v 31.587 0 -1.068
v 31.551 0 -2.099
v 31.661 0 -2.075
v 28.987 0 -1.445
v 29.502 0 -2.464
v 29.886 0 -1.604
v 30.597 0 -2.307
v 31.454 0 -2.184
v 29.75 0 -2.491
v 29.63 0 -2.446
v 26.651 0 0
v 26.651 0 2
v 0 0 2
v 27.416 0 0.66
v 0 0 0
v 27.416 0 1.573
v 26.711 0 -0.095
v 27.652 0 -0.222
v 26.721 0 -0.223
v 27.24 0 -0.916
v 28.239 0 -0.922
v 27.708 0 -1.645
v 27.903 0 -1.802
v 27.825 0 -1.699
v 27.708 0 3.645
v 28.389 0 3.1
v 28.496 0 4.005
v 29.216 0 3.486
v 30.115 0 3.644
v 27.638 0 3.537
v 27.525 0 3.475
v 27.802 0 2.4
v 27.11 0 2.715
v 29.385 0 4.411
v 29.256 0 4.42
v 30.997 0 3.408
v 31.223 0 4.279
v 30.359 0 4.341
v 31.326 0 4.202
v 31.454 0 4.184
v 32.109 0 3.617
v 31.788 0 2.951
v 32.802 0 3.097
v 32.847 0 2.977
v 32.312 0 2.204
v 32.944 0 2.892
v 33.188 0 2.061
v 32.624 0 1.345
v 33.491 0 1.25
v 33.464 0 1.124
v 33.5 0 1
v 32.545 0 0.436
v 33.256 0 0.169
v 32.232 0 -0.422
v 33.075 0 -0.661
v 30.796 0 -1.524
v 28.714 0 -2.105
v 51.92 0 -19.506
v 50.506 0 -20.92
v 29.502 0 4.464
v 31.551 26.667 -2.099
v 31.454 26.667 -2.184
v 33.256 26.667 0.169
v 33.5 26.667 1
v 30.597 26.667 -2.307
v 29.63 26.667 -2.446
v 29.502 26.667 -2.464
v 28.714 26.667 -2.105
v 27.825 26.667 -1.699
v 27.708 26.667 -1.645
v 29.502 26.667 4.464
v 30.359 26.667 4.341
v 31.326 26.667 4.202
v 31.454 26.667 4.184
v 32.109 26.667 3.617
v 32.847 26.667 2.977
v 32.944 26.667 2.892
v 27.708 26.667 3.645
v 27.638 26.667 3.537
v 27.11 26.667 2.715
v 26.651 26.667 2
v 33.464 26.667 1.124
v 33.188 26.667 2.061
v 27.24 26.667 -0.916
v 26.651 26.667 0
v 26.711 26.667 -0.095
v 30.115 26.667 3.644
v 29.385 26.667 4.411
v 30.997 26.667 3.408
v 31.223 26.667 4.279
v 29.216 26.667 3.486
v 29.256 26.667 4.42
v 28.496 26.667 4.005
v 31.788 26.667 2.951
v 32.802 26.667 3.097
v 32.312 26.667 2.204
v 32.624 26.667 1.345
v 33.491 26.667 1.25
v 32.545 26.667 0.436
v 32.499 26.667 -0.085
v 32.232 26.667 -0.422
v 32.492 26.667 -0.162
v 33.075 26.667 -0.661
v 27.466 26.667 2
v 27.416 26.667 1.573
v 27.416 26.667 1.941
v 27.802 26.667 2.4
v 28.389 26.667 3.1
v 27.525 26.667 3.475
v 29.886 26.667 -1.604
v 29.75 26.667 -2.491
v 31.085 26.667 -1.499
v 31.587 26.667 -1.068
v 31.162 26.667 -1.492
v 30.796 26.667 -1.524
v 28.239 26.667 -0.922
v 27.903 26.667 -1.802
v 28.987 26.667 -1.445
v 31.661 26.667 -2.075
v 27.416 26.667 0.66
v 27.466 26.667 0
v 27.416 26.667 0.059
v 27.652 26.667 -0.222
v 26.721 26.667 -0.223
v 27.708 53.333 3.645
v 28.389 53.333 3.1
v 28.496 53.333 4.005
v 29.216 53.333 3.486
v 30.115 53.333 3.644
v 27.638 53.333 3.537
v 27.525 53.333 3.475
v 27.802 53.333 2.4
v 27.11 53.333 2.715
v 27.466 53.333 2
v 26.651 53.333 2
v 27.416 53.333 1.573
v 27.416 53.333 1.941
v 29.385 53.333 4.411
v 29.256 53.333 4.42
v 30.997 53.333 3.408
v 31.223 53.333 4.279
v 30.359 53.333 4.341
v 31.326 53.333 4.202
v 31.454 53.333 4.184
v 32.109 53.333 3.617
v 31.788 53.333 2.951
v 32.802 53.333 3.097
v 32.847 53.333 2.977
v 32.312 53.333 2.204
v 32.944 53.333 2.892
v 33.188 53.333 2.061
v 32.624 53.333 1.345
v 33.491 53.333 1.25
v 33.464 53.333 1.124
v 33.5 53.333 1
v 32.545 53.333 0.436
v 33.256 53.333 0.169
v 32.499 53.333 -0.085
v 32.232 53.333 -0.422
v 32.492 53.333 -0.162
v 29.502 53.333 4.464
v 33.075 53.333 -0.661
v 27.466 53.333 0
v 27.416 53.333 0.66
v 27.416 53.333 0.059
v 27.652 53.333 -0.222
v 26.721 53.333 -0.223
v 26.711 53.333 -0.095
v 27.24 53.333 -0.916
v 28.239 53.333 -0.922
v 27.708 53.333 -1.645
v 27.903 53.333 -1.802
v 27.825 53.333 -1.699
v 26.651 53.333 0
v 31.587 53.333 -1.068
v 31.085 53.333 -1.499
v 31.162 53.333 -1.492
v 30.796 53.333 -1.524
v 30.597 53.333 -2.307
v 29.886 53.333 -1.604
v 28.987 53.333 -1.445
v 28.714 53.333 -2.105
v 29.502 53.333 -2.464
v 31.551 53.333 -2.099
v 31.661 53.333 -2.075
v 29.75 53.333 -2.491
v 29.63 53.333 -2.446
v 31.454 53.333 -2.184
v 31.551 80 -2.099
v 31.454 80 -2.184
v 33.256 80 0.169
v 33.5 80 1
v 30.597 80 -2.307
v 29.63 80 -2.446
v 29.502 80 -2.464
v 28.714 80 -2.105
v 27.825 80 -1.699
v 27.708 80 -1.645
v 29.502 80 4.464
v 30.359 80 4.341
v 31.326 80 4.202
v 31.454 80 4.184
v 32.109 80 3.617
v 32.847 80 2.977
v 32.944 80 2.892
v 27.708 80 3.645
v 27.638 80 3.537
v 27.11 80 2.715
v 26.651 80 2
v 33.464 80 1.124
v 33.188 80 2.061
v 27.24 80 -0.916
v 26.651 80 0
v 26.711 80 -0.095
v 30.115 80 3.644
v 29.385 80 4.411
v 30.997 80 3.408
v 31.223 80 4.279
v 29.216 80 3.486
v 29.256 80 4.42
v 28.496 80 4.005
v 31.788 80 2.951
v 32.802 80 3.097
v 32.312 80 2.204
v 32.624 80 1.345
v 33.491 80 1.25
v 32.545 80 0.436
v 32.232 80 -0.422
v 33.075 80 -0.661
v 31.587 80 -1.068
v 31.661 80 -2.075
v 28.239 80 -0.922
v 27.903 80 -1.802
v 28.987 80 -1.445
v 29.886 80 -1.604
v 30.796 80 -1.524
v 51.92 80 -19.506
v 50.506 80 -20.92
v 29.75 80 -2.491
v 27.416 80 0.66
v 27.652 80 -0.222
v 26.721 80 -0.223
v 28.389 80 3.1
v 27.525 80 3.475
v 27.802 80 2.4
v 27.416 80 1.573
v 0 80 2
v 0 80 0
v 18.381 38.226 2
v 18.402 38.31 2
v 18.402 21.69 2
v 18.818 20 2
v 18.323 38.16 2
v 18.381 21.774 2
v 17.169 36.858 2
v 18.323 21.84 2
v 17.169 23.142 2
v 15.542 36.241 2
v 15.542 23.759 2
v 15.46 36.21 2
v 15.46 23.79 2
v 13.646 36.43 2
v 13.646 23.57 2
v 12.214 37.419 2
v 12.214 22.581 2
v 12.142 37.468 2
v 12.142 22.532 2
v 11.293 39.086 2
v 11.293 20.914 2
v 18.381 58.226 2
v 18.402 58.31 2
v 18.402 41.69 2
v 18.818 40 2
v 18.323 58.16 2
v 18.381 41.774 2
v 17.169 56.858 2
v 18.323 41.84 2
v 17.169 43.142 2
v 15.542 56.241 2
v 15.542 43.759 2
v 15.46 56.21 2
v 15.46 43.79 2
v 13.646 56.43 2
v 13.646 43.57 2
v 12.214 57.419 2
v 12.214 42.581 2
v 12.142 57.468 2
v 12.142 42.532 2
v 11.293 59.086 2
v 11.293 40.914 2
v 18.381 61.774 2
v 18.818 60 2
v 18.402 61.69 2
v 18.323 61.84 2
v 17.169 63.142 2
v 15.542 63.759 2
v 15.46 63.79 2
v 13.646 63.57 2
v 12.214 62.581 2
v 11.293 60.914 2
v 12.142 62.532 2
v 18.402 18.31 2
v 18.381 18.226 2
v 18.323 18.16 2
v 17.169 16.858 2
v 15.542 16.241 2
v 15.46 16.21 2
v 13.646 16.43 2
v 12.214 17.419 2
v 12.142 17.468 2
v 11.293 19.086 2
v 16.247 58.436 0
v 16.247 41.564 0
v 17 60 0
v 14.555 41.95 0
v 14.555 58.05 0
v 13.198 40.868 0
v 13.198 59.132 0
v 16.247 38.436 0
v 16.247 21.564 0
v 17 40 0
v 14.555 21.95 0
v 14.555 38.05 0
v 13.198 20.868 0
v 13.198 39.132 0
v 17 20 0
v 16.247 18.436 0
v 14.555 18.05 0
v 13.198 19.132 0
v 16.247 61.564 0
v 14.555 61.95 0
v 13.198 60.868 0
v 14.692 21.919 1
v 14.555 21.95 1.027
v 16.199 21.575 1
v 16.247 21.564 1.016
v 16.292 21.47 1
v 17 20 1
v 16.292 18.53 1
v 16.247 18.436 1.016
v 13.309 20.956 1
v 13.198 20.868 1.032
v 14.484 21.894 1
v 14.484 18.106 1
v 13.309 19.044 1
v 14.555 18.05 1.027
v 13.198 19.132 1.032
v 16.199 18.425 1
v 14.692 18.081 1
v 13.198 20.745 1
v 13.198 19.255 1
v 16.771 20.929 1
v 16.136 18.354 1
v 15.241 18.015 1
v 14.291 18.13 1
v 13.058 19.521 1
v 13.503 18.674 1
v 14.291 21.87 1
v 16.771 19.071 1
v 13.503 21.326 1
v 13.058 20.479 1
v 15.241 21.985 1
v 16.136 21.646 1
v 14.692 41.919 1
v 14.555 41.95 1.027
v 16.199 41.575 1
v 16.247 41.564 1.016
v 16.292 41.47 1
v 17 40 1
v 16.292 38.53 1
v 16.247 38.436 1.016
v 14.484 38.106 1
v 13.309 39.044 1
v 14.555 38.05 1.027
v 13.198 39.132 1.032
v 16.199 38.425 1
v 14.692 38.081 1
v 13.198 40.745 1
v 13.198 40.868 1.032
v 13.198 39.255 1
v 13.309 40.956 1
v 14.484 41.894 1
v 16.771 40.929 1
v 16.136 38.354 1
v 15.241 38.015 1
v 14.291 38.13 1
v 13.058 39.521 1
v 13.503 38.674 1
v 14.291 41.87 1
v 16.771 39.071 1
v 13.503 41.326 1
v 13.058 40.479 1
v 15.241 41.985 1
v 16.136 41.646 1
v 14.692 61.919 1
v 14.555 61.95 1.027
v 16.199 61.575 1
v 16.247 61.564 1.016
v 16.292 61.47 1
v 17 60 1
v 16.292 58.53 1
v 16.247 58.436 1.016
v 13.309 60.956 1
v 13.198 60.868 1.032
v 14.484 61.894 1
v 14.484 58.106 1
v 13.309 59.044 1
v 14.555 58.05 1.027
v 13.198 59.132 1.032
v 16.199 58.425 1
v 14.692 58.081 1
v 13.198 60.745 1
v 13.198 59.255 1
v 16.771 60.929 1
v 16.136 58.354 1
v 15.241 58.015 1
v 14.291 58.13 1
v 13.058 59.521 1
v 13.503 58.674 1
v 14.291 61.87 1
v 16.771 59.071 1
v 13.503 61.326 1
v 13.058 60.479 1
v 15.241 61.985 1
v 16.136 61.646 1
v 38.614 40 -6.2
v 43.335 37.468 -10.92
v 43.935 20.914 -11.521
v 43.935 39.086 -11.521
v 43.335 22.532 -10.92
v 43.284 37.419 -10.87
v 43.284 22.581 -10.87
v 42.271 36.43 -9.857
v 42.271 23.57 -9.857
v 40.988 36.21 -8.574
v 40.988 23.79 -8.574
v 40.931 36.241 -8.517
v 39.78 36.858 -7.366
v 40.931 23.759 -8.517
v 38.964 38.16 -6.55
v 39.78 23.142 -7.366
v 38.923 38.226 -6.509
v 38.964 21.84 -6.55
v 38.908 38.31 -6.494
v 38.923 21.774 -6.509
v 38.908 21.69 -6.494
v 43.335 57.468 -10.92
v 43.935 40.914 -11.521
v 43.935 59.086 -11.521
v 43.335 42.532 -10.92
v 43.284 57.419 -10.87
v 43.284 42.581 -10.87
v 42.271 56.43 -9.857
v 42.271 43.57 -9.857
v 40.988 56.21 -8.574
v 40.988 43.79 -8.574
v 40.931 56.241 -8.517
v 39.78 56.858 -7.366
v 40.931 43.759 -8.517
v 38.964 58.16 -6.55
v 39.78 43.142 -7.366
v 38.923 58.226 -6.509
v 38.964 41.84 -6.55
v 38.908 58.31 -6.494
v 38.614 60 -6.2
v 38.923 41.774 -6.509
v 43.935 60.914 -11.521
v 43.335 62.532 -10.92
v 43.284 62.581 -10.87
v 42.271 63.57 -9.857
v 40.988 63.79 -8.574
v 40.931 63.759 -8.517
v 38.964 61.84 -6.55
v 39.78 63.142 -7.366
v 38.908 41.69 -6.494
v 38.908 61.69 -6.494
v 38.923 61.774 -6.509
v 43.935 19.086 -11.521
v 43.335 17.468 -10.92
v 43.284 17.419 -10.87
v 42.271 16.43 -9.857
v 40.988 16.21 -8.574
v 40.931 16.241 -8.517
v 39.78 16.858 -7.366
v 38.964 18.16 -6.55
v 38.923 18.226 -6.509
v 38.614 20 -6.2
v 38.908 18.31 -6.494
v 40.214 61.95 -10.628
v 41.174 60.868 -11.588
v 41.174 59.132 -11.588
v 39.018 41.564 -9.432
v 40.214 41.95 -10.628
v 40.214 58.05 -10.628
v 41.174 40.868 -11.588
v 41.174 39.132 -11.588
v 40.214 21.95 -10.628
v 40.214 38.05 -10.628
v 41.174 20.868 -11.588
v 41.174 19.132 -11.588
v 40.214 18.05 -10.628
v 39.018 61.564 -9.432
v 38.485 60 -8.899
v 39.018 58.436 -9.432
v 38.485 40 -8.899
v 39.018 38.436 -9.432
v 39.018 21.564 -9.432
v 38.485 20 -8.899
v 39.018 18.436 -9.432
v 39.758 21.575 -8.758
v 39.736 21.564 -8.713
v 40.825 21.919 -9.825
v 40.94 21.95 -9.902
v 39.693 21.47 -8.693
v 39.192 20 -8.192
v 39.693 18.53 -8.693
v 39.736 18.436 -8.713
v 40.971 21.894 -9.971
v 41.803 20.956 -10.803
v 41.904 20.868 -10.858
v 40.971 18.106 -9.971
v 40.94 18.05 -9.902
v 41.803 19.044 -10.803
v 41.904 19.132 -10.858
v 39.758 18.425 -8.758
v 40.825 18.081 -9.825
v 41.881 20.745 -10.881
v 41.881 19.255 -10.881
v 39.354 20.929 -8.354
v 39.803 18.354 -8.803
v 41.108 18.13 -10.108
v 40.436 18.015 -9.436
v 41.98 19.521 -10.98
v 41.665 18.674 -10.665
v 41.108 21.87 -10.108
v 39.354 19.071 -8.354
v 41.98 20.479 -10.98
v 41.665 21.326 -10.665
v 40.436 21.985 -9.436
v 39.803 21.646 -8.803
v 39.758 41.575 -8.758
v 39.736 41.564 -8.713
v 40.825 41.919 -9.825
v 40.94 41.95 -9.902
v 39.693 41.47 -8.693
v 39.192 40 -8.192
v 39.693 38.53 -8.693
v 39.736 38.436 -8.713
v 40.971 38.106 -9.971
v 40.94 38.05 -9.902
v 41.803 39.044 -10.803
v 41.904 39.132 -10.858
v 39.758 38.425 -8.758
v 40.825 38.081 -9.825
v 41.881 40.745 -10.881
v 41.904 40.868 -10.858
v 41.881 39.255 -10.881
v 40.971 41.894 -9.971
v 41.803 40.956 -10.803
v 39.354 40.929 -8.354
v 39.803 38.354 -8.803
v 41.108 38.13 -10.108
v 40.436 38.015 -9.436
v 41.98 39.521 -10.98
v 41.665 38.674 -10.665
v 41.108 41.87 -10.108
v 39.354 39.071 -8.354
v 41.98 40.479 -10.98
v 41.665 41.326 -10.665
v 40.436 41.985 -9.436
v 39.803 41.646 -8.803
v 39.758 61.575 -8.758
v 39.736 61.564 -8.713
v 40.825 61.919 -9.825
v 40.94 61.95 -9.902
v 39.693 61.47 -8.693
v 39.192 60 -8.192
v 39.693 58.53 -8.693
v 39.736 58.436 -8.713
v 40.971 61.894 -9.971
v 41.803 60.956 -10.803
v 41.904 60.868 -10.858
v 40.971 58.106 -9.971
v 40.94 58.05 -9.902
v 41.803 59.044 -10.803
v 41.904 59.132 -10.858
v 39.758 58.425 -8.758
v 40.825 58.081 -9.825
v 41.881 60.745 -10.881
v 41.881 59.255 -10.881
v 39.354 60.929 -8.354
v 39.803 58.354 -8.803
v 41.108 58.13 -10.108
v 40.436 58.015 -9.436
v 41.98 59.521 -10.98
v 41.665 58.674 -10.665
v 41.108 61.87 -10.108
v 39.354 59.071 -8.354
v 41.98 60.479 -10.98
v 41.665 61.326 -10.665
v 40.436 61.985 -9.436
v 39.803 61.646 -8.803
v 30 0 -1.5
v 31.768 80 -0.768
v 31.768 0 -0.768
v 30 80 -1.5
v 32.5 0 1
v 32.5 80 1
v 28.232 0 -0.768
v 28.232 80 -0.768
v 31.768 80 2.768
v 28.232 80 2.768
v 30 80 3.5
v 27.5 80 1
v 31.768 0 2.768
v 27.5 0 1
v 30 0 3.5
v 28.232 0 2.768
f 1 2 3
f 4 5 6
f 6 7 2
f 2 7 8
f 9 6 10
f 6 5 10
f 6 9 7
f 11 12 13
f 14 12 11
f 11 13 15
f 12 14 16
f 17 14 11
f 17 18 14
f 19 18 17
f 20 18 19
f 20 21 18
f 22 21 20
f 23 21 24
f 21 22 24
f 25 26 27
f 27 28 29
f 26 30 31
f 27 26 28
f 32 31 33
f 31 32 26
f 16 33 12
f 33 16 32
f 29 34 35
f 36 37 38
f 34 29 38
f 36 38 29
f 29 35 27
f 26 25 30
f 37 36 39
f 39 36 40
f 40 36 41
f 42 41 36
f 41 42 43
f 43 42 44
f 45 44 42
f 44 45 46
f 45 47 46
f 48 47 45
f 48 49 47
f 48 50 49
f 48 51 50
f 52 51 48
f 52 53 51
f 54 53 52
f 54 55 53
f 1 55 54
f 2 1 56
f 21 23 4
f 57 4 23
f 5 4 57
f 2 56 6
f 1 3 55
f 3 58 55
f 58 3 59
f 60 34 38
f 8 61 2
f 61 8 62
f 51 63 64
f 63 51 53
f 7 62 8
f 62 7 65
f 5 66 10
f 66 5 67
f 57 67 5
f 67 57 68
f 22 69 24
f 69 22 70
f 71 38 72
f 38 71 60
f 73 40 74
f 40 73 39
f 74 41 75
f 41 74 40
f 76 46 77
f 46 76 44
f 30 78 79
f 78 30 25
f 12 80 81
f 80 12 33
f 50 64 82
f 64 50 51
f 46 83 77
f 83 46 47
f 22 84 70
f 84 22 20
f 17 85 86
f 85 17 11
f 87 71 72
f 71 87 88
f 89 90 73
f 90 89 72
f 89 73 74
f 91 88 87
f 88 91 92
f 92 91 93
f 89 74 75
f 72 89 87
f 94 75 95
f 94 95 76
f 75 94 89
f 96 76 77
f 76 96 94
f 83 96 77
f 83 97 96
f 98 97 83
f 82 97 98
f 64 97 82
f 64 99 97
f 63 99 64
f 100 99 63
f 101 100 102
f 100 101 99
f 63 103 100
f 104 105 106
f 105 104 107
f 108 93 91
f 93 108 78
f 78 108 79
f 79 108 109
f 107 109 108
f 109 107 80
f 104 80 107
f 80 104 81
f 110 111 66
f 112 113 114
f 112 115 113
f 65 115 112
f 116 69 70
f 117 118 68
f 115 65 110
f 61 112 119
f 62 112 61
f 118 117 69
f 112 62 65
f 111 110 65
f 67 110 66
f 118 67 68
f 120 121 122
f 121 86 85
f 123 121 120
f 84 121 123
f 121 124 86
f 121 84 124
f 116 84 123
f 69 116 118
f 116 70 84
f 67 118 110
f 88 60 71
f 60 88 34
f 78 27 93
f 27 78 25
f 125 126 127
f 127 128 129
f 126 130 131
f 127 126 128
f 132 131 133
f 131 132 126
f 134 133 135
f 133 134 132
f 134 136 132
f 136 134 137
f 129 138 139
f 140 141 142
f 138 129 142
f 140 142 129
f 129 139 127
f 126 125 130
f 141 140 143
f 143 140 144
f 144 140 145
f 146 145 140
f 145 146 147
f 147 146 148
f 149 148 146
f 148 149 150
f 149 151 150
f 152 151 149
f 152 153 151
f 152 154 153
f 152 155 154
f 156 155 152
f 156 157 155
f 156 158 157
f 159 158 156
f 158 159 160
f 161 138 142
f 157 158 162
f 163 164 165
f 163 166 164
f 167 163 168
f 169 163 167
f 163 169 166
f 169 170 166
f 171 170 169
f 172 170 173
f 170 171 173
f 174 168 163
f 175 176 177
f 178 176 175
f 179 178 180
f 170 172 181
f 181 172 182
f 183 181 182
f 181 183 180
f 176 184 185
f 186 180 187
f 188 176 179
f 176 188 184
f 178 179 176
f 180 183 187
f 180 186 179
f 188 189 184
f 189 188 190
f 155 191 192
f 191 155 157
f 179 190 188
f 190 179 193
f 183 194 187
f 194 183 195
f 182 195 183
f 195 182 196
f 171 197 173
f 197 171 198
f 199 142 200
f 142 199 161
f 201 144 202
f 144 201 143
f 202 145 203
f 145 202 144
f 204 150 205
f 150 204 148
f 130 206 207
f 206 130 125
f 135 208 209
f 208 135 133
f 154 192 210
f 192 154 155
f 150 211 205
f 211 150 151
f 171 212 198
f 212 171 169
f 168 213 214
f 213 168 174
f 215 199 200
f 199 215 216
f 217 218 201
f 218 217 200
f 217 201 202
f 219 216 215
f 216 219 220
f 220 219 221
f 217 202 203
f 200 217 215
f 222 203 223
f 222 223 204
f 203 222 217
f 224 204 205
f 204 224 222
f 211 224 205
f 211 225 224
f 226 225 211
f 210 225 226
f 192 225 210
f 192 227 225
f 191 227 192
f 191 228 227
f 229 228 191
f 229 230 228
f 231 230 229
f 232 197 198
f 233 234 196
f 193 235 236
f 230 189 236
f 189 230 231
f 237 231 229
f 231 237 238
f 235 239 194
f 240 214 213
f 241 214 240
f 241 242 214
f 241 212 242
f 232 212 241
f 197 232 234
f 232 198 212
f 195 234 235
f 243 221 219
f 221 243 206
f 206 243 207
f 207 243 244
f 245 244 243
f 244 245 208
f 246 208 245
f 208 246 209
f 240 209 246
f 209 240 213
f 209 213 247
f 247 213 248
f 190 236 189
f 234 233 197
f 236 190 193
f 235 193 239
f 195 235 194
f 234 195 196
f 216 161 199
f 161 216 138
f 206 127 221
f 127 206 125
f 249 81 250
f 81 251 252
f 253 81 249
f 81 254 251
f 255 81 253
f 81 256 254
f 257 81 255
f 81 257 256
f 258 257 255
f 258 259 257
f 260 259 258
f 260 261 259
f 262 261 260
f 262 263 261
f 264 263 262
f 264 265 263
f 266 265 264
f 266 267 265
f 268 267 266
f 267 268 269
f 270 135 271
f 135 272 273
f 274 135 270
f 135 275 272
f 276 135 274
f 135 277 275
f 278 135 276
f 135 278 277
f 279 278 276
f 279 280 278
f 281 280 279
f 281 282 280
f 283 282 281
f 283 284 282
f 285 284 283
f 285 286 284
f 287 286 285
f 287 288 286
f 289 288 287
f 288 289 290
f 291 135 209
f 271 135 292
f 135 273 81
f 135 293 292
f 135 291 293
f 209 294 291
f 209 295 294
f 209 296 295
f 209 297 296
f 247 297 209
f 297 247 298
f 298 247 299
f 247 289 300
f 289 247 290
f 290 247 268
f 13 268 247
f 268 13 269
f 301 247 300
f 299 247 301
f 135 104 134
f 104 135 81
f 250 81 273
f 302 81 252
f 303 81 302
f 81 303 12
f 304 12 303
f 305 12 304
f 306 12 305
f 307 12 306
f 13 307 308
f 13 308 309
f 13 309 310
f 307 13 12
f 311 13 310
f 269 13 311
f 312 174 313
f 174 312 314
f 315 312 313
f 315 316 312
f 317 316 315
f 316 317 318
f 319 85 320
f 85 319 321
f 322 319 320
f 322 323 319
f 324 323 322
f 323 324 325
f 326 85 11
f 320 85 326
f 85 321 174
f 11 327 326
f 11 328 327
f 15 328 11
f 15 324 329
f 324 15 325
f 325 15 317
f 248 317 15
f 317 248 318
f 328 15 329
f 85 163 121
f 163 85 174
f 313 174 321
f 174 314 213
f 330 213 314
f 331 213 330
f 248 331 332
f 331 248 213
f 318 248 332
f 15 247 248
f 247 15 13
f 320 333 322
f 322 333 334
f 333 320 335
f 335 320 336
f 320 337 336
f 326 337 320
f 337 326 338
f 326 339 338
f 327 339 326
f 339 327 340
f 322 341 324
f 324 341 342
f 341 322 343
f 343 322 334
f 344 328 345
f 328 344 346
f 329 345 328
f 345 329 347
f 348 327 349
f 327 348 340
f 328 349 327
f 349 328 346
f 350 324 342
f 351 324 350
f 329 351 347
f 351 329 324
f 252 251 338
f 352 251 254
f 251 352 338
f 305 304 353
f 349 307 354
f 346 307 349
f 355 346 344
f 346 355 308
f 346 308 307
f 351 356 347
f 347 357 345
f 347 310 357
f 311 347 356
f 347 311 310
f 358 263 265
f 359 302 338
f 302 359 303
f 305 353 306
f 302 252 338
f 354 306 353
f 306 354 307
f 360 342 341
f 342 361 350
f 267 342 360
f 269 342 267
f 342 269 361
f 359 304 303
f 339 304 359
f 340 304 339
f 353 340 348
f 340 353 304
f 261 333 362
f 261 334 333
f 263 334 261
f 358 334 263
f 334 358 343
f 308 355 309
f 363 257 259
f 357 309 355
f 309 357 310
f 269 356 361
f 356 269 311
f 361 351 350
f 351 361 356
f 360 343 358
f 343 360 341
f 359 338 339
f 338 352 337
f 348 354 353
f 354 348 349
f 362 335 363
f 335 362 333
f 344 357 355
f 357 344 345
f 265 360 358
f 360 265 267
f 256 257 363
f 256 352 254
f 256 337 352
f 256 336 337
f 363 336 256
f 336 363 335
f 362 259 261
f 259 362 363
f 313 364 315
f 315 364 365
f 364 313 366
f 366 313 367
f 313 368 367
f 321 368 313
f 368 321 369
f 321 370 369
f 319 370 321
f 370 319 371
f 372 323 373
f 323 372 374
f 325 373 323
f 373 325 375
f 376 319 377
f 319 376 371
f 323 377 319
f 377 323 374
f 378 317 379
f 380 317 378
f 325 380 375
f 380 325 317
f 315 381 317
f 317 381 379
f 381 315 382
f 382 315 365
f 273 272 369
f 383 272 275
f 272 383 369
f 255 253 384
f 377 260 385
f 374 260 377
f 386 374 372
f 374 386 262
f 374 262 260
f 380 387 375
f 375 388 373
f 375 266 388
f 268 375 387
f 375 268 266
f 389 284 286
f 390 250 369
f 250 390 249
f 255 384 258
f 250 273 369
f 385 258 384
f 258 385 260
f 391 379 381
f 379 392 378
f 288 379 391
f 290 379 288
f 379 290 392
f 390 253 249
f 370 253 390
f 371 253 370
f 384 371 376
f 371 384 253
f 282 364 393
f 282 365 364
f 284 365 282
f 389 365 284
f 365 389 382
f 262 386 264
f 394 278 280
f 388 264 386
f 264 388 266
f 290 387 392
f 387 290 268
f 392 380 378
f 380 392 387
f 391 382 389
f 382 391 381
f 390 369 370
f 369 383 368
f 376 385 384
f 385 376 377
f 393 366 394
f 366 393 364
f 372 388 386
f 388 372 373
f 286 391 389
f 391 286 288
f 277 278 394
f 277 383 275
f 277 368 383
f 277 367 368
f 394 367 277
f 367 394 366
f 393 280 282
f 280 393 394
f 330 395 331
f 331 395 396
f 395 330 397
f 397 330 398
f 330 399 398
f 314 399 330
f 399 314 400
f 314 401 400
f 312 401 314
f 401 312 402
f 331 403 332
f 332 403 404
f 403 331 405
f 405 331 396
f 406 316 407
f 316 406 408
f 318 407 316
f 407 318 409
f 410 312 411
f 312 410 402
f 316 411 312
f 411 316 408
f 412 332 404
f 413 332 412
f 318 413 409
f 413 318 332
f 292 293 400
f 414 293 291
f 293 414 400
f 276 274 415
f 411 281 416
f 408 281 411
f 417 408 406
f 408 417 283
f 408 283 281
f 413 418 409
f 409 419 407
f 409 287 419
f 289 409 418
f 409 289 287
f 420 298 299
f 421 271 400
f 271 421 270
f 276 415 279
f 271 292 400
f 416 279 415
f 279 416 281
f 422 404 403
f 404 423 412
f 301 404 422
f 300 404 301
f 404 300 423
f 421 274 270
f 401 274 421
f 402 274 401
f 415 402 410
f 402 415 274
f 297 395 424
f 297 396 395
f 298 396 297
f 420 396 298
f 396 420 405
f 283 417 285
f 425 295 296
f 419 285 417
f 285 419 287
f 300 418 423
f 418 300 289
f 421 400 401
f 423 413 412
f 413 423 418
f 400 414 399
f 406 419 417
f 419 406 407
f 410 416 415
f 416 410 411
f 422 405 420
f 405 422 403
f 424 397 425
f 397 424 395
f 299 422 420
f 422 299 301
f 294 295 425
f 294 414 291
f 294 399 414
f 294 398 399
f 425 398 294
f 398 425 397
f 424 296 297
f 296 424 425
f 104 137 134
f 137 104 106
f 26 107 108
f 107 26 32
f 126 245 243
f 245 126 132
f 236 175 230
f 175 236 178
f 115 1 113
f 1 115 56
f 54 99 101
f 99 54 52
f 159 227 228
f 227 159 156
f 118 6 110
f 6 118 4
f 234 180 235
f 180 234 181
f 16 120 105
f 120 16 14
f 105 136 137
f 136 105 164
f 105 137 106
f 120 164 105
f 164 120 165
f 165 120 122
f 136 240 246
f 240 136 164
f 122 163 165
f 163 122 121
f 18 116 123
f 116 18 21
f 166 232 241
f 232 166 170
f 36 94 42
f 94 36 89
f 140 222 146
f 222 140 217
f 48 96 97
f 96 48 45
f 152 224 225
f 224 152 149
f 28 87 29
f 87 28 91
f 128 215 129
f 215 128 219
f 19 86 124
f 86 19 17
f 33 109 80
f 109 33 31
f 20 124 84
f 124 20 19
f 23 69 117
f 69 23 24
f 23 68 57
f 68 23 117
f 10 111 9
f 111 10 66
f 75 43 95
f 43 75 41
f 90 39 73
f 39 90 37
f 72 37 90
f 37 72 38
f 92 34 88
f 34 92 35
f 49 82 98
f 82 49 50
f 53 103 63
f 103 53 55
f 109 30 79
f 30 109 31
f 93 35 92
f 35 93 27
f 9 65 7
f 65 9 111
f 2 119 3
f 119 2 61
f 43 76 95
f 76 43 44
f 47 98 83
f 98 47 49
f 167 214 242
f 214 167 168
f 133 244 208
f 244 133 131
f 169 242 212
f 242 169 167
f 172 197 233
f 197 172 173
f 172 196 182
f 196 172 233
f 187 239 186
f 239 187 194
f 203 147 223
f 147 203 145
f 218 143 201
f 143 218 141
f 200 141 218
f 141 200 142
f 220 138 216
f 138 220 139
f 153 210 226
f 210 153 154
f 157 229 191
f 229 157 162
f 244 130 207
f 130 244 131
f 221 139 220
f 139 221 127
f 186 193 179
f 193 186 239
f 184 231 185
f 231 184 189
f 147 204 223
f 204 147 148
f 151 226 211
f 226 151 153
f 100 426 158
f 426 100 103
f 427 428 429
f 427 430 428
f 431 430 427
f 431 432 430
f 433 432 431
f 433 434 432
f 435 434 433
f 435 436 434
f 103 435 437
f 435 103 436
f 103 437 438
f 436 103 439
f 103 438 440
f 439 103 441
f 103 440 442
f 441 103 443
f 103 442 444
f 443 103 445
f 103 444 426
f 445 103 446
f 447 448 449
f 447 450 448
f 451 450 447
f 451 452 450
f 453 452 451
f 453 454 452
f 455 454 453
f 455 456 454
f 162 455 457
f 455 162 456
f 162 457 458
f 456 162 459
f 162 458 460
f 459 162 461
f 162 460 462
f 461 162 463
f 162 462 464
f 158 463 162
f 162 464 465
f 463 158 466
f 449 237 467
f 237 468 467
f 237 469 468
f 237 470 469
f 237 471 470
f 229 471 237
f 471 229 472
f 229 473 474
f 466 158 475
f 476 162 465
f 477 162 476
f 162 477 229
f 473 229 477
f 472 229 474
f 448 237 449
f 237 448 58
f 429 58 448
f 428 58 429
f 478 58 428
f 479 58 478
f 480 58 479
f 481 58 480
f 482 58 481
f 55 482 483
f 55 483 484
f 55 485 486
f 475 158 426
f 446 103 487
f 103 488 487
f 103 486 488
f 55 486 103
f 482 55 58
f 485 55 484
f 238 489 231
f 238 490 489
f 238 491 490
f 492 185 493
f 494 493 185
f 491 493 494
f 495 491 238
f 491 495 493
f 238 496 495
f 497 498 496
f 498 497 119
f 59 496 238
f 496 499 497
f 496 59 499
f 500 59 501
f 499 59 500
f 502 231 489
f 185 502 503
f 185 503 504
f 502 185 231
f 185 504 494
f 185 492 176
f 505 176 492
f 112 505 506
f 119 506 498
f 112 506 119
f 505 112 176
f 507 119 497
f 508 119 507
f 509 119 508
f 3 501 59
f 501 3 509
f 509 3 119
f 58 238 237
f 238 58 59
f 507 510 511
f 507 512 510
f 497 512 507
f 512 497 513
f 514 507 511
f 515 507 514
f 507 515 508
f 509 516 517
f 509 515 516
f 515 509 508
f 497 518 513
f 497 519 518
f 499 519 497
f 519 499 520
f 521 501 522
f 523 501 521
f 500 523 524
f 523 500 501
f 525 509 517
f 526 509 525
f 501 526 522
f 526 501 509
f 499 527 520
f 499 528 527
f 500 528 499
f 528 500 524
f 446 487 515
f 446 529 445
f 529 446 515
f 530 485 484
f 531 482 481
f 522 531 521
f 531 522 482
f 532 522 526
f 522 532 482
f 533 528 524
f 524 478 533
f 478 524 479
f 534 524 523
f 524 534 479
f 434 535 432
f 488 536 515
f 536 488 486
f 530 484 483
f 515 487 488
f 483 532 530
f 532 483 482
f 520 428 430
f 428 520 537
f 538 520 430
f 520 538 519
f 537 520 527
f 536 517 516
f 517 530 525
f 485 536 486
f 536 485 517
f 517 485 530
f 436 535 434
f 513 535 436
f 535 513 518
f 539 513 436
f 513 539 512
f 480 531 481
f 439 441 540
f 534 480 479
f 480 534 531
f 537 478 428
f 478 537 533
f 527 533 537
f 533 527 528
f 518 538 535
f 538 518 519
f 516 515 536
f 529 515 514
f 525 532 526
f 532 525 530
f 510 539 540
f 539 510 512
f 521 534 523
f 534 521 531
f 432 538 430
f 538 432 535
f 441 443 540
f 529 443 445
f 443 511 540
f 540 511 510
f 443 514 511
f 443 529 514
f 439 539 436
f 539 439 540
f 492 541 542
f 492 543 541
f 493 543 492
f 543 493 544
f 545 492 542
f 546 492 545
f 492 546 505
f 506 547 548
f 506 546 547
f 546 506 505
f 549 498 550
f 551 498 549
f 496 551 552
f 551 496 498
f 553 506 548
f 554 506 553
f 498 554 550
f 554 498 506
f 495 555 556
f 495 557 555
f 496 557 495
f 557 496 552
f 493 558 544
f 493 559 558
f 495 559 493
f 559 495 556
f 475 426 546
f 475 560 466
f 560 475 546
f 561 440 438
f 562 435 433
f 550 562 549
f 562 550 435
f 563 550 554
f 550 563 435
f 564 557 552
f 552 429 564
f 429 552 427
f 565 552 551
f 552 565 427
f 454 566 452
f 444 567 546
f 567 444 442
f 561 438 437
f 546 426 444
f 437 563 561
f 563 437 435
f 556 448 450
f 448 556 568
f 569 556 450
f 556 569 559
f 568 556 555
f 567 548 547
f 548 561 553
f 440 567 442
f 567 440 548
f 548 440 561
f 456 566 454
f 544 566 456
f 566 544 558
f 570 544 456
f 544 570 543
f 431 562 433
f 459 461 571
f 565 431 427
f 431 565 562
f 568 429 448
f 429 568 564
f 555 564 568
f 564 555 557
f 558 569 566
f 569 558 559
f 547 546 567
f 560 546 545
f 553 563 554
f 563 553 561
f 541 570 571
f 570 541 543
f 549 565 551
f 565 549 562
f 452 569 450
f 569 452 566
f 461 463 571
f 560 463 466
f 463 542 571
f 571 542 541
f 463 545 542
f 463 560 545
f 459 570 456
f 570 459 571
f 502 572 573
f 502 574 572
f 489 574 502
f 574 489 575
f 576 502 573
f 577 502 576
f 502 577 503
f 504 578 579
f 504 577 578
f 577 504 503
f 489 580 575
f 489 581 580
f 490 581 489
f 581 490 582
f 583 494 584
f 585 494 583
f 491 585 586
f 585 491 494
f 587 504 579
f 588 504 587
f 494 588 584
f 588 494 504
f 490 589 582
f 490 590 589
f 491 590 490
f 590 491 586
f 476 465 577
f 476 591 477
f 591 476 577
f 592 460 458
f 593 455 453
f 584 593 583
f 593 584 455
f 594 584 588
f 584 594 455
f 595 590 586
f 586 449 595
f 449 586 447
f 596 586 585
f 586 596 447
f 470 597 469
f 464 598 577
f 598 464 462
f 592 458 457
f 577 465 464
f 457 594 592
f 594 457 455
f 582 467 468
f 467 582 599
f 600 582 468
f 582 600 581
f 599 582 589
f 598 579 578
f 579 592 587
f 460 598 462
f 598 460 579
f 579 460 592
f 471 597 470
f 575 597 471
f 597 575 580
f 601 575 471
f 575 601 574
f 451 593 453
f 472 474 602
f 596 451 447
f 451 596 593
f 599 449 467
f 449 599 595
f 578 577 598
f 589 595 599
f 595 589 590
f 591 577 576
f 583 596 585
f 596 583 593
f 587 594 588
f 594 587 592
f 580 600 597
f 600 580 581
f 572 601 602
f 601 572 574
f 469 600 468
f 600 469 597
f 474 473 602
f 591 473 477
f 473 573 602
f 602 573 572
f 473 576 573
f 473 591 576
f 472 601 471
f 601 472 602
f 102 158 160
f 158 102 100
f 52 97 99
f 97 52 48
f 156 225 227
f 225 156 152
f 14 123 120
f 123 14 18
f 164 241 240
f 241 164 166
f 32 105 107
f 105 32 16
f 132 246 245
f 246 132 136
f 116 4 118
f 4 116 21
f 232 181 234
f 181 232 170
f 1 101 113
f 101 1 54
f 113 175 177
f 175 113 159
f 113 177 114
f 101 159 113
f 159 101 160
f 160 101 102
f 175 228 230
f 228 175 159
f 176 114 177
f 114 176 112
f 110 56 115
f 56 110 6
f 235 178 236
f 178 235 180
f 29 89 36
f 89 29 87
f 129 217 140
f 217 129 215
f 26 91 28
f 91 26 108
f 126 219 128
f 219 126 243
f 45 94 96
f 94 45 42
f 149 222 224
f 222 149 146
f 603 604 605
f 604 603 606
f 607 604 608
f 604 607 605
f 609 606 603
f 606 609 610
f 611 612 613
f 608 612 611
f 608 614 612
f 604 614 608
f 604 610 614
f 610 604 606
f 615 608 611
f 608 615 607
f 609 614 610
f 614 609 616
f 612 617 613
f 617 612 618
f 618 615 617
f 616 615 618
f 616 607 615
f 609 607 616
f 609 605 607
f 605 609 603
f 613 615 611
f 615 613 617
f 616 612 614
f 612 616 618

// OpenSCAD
// file: ../libs/utils.scad
// SketchCaddy - 通用工具函数库

use <global_params.scad>

// ============================================
// 1010铝型材截面模块
// ============================================
module extrusion_profile_1010(size = 10) {
    wall = 1.2;
    slot_width = 4;
    slot_depth = 2.5;
    
    difference() {
        // 外轮廓
        square(size, center = true);
        
        // 中心孔
        circle(d = size - 2 * wall);
        
        // 四个T槽
        for (angle = [0, 90, 180, 270]) {
            rotate([0, 0, angle])
            translate([0, size/2 - slot_depth/2])
            square([slot_width, slot_depth + 0.1], center = true);
        }
    }
}

// ============================================
// 铝型材拉伸模块
// ============================================
module extrusion_1010(length, size = 10) {
    color(color_frame)
    rotate([90, 0, 0])
    linear_extrude(height = length, center = false)
    extrusion_profile_1010(size);
}

// 沿X轴的型材
module extrusion_x(length, size = 10) {
    rotate([0, 90, 0])
    rotate([0, 0, 90])
    extrusion_1010(length, size);
}

// 沿Y轴的型材
module extrusion_y(length, size = 10) {
    rotate([0, 0, 0])
    extrusion_1010(length, size);
}

// 沿Z轴的型材
module extrusion_z(length, size = 10) {
    rotate([-90, 0, 0])
    extrusion_1010(length, size);
}

// ============================================
// 圆角矩形
// ============================================
module rounded_rect(size, radius, height) {
    linear_extrude(height = height)
    offset(r = radius)
    offset(r = -radius)
    square([size.x, size.y], center = true);
}

// ============================================
// 带圆角的面板
// ============================================
module panel(width, height, thickness, corner_radius = 3) {
    color(color_panel)
    translate([0, 0, thickness/2])
    rounded_rect([width, height], corner_radius, thickness);
}

// ============================================
// 螺丝孔
// ============================================
module screw_hole(diameter, depth, countersink = false) {
    union() {
        cylinder(d = diameter, h = depth + 0.1);
        if (countersink) {
            translate([0, 0, depth - diameter/2])
            cylinder(d1 = diameter, d2 = diameter * 2, h = diameter/2);
        }
    }
}

// ============================================
// 爆炸视图辅助
// ============================================
module explode(direction, distance, explode_factor = 0) {
    translate(direction * distance * explode_factor)
    children();
}
// file: ../libs/global_params.scad
// SketchCaddy - 全局参数定义
// 所有单位：毫米 (mm)

// ============================================
// 核心箱体尺寸
// ============================================
global_box_length = 520;   // 长 (X轴)
global_box_width = 520;    // 宽 (Y轴)
global_box_height = 750;   // 高 (Z轴)

// ============================================
// 面板厚度
// ============================================
panel_thickness = 5; // PP蜂窝板或航空板厚度

// ============================================
// 铝型材规格 (1010系列)
// ============================================
extrusion_size = 10;           // 10mm x 10mm 轻型铝型材
extrusion_slot_width = 8;      // 型材T型槽宽度
extrusion_wall_thickness = 1.2; // 型材壁厚
extrusion_inner_size = extrusion_size - 2 * extrusion_wall_thickness;

// ============================================
// 画架参数
// ============================================
easel_bag_length = 750;        // 画架袋长度
easel_bag_diameter = 100;      // 画架袋直径
easel_height_max = 1500;       // 画架最大展开高度

// ============================================
// 轮子参数
// ============================================
wheel_diameter = 203.2;        // 8英寸 = 203.2mm
wheel_width = 50;              // 轮宽

// ============================================
// 公差与配合
// ============================================
tolerance = 1;                 // 面板与框架配合间隙
$fn = 32;                      // 圆形分辨率

// ============================================
// 颜色定义
// ============================================
color_frame = [0.7, 0.7, 0.7];      // 铝型材银灰色
color_panel = [0.2, 0.2, 0.2];      // 面板深灰色
color_accent = [0.9, 0.5, 0.1];     // 强调色橙色
color_wheel = [0.1, 0.1, 0.1];      // 轮子黑色
color_handle = [0.3, 0.3, 0.35];    // 拉杆深灰

// ============================================
// 辅助函数
// ============================================

// 计算框架内部可用空间
function inner_length() = global_box_length - 2 * extrusion_size - 2 * panel_thickness;
function inner_width() = global_box_width - 2 * extrusion_size - 2 * panel_thickness;
function inner_height() = global_box_height - 2 * extrusion_size - 2 * panel_thickness;
// main file
// ============================================
// F01_Heavy_Duty_Hinge.scad
// 重型平面合页 - 用于门板，不锈钢
// ============================================

use <../libs/global_params.scad>
use <../libs/utils.scad>

// 合页参数
hinge_length = 80;           // 合页总长
leaf_width = 30;             // 单侧叶片宽度
leaf_thickness = 2;          // 叶片厚度
pin_diameter = 5;            // 转轴直径
knuckle_count = 3;           // 转轴节数

// ============================================
// 合页叶片模块
// ============================================
module F01_Hinge_Leaf() {
    color([0.8, 0.8, 0.8])
    difference() {
        union() {
            // 叶片主体
            cube([leaf_width, hinge_length, leaf_thickness]);
            
            // 转轴套筒（交替排列）
            for (i = [0:2:knuckle_count-1]) {
                knuckle_length = hinge_length / knuckle_count;
                translate([leaf_width, i * knuckle_length, leaf_thickness/2])
                rotate([-90, 0, 0])
                cylinder(d = pin_diameter + 2, h = knuckle_length);
            }
        }
        
        // 转轴孔
        translate([leaf_width, -0.1, leaf_thickness/2])
        rotate([-90, 0, 0])
        cylinder(d = pin_diameter + 0.5, h = hinge_length + 0.2);
        
        // 安装孔
        for (y = [hinge_length/4, hinge_length/2, 3*hinge_length/4]) {
            translate([leaf_width/2, y, -0.1])
            cylinder(d = 4, h = leaf_thickness + 0.2);
            // 沉头
            translate([leaf_width/2, y, leaf_thickness - 1])
            cylinder(d1 = 4, d2 = 8, h = 1.1);
        }
    }
}

// ============================================
// 完整合页模块
// ============================================
module F01_Heavy_Duty_Hinge(angle = 0) {
    // 固定侧叶片
    F01_Hinge_Leaf();
    
    // 活动侧叶片
    translate([leaf_width, 0, leaf_thickness/2])
    rotate([0, angle, 0])
    translate([-leaf_width, 0, -leaf_thickness/2])
    mirror([1, 0, 0])
    translate([-leaf_width * 2, 0, 0])
    F01_Hinge_Leaf();
    
    // 转轴
    color([0.7, 0.7, 0.7])
    translate([leaf_width, 0, leaf_thickness/2])
    rotate([-90, 0, 0])
    cylinder(d = pin_diameter, h = hinge_length);
}

// 预览
F01_Heavy_Duty_Hinge(angle = 45);
